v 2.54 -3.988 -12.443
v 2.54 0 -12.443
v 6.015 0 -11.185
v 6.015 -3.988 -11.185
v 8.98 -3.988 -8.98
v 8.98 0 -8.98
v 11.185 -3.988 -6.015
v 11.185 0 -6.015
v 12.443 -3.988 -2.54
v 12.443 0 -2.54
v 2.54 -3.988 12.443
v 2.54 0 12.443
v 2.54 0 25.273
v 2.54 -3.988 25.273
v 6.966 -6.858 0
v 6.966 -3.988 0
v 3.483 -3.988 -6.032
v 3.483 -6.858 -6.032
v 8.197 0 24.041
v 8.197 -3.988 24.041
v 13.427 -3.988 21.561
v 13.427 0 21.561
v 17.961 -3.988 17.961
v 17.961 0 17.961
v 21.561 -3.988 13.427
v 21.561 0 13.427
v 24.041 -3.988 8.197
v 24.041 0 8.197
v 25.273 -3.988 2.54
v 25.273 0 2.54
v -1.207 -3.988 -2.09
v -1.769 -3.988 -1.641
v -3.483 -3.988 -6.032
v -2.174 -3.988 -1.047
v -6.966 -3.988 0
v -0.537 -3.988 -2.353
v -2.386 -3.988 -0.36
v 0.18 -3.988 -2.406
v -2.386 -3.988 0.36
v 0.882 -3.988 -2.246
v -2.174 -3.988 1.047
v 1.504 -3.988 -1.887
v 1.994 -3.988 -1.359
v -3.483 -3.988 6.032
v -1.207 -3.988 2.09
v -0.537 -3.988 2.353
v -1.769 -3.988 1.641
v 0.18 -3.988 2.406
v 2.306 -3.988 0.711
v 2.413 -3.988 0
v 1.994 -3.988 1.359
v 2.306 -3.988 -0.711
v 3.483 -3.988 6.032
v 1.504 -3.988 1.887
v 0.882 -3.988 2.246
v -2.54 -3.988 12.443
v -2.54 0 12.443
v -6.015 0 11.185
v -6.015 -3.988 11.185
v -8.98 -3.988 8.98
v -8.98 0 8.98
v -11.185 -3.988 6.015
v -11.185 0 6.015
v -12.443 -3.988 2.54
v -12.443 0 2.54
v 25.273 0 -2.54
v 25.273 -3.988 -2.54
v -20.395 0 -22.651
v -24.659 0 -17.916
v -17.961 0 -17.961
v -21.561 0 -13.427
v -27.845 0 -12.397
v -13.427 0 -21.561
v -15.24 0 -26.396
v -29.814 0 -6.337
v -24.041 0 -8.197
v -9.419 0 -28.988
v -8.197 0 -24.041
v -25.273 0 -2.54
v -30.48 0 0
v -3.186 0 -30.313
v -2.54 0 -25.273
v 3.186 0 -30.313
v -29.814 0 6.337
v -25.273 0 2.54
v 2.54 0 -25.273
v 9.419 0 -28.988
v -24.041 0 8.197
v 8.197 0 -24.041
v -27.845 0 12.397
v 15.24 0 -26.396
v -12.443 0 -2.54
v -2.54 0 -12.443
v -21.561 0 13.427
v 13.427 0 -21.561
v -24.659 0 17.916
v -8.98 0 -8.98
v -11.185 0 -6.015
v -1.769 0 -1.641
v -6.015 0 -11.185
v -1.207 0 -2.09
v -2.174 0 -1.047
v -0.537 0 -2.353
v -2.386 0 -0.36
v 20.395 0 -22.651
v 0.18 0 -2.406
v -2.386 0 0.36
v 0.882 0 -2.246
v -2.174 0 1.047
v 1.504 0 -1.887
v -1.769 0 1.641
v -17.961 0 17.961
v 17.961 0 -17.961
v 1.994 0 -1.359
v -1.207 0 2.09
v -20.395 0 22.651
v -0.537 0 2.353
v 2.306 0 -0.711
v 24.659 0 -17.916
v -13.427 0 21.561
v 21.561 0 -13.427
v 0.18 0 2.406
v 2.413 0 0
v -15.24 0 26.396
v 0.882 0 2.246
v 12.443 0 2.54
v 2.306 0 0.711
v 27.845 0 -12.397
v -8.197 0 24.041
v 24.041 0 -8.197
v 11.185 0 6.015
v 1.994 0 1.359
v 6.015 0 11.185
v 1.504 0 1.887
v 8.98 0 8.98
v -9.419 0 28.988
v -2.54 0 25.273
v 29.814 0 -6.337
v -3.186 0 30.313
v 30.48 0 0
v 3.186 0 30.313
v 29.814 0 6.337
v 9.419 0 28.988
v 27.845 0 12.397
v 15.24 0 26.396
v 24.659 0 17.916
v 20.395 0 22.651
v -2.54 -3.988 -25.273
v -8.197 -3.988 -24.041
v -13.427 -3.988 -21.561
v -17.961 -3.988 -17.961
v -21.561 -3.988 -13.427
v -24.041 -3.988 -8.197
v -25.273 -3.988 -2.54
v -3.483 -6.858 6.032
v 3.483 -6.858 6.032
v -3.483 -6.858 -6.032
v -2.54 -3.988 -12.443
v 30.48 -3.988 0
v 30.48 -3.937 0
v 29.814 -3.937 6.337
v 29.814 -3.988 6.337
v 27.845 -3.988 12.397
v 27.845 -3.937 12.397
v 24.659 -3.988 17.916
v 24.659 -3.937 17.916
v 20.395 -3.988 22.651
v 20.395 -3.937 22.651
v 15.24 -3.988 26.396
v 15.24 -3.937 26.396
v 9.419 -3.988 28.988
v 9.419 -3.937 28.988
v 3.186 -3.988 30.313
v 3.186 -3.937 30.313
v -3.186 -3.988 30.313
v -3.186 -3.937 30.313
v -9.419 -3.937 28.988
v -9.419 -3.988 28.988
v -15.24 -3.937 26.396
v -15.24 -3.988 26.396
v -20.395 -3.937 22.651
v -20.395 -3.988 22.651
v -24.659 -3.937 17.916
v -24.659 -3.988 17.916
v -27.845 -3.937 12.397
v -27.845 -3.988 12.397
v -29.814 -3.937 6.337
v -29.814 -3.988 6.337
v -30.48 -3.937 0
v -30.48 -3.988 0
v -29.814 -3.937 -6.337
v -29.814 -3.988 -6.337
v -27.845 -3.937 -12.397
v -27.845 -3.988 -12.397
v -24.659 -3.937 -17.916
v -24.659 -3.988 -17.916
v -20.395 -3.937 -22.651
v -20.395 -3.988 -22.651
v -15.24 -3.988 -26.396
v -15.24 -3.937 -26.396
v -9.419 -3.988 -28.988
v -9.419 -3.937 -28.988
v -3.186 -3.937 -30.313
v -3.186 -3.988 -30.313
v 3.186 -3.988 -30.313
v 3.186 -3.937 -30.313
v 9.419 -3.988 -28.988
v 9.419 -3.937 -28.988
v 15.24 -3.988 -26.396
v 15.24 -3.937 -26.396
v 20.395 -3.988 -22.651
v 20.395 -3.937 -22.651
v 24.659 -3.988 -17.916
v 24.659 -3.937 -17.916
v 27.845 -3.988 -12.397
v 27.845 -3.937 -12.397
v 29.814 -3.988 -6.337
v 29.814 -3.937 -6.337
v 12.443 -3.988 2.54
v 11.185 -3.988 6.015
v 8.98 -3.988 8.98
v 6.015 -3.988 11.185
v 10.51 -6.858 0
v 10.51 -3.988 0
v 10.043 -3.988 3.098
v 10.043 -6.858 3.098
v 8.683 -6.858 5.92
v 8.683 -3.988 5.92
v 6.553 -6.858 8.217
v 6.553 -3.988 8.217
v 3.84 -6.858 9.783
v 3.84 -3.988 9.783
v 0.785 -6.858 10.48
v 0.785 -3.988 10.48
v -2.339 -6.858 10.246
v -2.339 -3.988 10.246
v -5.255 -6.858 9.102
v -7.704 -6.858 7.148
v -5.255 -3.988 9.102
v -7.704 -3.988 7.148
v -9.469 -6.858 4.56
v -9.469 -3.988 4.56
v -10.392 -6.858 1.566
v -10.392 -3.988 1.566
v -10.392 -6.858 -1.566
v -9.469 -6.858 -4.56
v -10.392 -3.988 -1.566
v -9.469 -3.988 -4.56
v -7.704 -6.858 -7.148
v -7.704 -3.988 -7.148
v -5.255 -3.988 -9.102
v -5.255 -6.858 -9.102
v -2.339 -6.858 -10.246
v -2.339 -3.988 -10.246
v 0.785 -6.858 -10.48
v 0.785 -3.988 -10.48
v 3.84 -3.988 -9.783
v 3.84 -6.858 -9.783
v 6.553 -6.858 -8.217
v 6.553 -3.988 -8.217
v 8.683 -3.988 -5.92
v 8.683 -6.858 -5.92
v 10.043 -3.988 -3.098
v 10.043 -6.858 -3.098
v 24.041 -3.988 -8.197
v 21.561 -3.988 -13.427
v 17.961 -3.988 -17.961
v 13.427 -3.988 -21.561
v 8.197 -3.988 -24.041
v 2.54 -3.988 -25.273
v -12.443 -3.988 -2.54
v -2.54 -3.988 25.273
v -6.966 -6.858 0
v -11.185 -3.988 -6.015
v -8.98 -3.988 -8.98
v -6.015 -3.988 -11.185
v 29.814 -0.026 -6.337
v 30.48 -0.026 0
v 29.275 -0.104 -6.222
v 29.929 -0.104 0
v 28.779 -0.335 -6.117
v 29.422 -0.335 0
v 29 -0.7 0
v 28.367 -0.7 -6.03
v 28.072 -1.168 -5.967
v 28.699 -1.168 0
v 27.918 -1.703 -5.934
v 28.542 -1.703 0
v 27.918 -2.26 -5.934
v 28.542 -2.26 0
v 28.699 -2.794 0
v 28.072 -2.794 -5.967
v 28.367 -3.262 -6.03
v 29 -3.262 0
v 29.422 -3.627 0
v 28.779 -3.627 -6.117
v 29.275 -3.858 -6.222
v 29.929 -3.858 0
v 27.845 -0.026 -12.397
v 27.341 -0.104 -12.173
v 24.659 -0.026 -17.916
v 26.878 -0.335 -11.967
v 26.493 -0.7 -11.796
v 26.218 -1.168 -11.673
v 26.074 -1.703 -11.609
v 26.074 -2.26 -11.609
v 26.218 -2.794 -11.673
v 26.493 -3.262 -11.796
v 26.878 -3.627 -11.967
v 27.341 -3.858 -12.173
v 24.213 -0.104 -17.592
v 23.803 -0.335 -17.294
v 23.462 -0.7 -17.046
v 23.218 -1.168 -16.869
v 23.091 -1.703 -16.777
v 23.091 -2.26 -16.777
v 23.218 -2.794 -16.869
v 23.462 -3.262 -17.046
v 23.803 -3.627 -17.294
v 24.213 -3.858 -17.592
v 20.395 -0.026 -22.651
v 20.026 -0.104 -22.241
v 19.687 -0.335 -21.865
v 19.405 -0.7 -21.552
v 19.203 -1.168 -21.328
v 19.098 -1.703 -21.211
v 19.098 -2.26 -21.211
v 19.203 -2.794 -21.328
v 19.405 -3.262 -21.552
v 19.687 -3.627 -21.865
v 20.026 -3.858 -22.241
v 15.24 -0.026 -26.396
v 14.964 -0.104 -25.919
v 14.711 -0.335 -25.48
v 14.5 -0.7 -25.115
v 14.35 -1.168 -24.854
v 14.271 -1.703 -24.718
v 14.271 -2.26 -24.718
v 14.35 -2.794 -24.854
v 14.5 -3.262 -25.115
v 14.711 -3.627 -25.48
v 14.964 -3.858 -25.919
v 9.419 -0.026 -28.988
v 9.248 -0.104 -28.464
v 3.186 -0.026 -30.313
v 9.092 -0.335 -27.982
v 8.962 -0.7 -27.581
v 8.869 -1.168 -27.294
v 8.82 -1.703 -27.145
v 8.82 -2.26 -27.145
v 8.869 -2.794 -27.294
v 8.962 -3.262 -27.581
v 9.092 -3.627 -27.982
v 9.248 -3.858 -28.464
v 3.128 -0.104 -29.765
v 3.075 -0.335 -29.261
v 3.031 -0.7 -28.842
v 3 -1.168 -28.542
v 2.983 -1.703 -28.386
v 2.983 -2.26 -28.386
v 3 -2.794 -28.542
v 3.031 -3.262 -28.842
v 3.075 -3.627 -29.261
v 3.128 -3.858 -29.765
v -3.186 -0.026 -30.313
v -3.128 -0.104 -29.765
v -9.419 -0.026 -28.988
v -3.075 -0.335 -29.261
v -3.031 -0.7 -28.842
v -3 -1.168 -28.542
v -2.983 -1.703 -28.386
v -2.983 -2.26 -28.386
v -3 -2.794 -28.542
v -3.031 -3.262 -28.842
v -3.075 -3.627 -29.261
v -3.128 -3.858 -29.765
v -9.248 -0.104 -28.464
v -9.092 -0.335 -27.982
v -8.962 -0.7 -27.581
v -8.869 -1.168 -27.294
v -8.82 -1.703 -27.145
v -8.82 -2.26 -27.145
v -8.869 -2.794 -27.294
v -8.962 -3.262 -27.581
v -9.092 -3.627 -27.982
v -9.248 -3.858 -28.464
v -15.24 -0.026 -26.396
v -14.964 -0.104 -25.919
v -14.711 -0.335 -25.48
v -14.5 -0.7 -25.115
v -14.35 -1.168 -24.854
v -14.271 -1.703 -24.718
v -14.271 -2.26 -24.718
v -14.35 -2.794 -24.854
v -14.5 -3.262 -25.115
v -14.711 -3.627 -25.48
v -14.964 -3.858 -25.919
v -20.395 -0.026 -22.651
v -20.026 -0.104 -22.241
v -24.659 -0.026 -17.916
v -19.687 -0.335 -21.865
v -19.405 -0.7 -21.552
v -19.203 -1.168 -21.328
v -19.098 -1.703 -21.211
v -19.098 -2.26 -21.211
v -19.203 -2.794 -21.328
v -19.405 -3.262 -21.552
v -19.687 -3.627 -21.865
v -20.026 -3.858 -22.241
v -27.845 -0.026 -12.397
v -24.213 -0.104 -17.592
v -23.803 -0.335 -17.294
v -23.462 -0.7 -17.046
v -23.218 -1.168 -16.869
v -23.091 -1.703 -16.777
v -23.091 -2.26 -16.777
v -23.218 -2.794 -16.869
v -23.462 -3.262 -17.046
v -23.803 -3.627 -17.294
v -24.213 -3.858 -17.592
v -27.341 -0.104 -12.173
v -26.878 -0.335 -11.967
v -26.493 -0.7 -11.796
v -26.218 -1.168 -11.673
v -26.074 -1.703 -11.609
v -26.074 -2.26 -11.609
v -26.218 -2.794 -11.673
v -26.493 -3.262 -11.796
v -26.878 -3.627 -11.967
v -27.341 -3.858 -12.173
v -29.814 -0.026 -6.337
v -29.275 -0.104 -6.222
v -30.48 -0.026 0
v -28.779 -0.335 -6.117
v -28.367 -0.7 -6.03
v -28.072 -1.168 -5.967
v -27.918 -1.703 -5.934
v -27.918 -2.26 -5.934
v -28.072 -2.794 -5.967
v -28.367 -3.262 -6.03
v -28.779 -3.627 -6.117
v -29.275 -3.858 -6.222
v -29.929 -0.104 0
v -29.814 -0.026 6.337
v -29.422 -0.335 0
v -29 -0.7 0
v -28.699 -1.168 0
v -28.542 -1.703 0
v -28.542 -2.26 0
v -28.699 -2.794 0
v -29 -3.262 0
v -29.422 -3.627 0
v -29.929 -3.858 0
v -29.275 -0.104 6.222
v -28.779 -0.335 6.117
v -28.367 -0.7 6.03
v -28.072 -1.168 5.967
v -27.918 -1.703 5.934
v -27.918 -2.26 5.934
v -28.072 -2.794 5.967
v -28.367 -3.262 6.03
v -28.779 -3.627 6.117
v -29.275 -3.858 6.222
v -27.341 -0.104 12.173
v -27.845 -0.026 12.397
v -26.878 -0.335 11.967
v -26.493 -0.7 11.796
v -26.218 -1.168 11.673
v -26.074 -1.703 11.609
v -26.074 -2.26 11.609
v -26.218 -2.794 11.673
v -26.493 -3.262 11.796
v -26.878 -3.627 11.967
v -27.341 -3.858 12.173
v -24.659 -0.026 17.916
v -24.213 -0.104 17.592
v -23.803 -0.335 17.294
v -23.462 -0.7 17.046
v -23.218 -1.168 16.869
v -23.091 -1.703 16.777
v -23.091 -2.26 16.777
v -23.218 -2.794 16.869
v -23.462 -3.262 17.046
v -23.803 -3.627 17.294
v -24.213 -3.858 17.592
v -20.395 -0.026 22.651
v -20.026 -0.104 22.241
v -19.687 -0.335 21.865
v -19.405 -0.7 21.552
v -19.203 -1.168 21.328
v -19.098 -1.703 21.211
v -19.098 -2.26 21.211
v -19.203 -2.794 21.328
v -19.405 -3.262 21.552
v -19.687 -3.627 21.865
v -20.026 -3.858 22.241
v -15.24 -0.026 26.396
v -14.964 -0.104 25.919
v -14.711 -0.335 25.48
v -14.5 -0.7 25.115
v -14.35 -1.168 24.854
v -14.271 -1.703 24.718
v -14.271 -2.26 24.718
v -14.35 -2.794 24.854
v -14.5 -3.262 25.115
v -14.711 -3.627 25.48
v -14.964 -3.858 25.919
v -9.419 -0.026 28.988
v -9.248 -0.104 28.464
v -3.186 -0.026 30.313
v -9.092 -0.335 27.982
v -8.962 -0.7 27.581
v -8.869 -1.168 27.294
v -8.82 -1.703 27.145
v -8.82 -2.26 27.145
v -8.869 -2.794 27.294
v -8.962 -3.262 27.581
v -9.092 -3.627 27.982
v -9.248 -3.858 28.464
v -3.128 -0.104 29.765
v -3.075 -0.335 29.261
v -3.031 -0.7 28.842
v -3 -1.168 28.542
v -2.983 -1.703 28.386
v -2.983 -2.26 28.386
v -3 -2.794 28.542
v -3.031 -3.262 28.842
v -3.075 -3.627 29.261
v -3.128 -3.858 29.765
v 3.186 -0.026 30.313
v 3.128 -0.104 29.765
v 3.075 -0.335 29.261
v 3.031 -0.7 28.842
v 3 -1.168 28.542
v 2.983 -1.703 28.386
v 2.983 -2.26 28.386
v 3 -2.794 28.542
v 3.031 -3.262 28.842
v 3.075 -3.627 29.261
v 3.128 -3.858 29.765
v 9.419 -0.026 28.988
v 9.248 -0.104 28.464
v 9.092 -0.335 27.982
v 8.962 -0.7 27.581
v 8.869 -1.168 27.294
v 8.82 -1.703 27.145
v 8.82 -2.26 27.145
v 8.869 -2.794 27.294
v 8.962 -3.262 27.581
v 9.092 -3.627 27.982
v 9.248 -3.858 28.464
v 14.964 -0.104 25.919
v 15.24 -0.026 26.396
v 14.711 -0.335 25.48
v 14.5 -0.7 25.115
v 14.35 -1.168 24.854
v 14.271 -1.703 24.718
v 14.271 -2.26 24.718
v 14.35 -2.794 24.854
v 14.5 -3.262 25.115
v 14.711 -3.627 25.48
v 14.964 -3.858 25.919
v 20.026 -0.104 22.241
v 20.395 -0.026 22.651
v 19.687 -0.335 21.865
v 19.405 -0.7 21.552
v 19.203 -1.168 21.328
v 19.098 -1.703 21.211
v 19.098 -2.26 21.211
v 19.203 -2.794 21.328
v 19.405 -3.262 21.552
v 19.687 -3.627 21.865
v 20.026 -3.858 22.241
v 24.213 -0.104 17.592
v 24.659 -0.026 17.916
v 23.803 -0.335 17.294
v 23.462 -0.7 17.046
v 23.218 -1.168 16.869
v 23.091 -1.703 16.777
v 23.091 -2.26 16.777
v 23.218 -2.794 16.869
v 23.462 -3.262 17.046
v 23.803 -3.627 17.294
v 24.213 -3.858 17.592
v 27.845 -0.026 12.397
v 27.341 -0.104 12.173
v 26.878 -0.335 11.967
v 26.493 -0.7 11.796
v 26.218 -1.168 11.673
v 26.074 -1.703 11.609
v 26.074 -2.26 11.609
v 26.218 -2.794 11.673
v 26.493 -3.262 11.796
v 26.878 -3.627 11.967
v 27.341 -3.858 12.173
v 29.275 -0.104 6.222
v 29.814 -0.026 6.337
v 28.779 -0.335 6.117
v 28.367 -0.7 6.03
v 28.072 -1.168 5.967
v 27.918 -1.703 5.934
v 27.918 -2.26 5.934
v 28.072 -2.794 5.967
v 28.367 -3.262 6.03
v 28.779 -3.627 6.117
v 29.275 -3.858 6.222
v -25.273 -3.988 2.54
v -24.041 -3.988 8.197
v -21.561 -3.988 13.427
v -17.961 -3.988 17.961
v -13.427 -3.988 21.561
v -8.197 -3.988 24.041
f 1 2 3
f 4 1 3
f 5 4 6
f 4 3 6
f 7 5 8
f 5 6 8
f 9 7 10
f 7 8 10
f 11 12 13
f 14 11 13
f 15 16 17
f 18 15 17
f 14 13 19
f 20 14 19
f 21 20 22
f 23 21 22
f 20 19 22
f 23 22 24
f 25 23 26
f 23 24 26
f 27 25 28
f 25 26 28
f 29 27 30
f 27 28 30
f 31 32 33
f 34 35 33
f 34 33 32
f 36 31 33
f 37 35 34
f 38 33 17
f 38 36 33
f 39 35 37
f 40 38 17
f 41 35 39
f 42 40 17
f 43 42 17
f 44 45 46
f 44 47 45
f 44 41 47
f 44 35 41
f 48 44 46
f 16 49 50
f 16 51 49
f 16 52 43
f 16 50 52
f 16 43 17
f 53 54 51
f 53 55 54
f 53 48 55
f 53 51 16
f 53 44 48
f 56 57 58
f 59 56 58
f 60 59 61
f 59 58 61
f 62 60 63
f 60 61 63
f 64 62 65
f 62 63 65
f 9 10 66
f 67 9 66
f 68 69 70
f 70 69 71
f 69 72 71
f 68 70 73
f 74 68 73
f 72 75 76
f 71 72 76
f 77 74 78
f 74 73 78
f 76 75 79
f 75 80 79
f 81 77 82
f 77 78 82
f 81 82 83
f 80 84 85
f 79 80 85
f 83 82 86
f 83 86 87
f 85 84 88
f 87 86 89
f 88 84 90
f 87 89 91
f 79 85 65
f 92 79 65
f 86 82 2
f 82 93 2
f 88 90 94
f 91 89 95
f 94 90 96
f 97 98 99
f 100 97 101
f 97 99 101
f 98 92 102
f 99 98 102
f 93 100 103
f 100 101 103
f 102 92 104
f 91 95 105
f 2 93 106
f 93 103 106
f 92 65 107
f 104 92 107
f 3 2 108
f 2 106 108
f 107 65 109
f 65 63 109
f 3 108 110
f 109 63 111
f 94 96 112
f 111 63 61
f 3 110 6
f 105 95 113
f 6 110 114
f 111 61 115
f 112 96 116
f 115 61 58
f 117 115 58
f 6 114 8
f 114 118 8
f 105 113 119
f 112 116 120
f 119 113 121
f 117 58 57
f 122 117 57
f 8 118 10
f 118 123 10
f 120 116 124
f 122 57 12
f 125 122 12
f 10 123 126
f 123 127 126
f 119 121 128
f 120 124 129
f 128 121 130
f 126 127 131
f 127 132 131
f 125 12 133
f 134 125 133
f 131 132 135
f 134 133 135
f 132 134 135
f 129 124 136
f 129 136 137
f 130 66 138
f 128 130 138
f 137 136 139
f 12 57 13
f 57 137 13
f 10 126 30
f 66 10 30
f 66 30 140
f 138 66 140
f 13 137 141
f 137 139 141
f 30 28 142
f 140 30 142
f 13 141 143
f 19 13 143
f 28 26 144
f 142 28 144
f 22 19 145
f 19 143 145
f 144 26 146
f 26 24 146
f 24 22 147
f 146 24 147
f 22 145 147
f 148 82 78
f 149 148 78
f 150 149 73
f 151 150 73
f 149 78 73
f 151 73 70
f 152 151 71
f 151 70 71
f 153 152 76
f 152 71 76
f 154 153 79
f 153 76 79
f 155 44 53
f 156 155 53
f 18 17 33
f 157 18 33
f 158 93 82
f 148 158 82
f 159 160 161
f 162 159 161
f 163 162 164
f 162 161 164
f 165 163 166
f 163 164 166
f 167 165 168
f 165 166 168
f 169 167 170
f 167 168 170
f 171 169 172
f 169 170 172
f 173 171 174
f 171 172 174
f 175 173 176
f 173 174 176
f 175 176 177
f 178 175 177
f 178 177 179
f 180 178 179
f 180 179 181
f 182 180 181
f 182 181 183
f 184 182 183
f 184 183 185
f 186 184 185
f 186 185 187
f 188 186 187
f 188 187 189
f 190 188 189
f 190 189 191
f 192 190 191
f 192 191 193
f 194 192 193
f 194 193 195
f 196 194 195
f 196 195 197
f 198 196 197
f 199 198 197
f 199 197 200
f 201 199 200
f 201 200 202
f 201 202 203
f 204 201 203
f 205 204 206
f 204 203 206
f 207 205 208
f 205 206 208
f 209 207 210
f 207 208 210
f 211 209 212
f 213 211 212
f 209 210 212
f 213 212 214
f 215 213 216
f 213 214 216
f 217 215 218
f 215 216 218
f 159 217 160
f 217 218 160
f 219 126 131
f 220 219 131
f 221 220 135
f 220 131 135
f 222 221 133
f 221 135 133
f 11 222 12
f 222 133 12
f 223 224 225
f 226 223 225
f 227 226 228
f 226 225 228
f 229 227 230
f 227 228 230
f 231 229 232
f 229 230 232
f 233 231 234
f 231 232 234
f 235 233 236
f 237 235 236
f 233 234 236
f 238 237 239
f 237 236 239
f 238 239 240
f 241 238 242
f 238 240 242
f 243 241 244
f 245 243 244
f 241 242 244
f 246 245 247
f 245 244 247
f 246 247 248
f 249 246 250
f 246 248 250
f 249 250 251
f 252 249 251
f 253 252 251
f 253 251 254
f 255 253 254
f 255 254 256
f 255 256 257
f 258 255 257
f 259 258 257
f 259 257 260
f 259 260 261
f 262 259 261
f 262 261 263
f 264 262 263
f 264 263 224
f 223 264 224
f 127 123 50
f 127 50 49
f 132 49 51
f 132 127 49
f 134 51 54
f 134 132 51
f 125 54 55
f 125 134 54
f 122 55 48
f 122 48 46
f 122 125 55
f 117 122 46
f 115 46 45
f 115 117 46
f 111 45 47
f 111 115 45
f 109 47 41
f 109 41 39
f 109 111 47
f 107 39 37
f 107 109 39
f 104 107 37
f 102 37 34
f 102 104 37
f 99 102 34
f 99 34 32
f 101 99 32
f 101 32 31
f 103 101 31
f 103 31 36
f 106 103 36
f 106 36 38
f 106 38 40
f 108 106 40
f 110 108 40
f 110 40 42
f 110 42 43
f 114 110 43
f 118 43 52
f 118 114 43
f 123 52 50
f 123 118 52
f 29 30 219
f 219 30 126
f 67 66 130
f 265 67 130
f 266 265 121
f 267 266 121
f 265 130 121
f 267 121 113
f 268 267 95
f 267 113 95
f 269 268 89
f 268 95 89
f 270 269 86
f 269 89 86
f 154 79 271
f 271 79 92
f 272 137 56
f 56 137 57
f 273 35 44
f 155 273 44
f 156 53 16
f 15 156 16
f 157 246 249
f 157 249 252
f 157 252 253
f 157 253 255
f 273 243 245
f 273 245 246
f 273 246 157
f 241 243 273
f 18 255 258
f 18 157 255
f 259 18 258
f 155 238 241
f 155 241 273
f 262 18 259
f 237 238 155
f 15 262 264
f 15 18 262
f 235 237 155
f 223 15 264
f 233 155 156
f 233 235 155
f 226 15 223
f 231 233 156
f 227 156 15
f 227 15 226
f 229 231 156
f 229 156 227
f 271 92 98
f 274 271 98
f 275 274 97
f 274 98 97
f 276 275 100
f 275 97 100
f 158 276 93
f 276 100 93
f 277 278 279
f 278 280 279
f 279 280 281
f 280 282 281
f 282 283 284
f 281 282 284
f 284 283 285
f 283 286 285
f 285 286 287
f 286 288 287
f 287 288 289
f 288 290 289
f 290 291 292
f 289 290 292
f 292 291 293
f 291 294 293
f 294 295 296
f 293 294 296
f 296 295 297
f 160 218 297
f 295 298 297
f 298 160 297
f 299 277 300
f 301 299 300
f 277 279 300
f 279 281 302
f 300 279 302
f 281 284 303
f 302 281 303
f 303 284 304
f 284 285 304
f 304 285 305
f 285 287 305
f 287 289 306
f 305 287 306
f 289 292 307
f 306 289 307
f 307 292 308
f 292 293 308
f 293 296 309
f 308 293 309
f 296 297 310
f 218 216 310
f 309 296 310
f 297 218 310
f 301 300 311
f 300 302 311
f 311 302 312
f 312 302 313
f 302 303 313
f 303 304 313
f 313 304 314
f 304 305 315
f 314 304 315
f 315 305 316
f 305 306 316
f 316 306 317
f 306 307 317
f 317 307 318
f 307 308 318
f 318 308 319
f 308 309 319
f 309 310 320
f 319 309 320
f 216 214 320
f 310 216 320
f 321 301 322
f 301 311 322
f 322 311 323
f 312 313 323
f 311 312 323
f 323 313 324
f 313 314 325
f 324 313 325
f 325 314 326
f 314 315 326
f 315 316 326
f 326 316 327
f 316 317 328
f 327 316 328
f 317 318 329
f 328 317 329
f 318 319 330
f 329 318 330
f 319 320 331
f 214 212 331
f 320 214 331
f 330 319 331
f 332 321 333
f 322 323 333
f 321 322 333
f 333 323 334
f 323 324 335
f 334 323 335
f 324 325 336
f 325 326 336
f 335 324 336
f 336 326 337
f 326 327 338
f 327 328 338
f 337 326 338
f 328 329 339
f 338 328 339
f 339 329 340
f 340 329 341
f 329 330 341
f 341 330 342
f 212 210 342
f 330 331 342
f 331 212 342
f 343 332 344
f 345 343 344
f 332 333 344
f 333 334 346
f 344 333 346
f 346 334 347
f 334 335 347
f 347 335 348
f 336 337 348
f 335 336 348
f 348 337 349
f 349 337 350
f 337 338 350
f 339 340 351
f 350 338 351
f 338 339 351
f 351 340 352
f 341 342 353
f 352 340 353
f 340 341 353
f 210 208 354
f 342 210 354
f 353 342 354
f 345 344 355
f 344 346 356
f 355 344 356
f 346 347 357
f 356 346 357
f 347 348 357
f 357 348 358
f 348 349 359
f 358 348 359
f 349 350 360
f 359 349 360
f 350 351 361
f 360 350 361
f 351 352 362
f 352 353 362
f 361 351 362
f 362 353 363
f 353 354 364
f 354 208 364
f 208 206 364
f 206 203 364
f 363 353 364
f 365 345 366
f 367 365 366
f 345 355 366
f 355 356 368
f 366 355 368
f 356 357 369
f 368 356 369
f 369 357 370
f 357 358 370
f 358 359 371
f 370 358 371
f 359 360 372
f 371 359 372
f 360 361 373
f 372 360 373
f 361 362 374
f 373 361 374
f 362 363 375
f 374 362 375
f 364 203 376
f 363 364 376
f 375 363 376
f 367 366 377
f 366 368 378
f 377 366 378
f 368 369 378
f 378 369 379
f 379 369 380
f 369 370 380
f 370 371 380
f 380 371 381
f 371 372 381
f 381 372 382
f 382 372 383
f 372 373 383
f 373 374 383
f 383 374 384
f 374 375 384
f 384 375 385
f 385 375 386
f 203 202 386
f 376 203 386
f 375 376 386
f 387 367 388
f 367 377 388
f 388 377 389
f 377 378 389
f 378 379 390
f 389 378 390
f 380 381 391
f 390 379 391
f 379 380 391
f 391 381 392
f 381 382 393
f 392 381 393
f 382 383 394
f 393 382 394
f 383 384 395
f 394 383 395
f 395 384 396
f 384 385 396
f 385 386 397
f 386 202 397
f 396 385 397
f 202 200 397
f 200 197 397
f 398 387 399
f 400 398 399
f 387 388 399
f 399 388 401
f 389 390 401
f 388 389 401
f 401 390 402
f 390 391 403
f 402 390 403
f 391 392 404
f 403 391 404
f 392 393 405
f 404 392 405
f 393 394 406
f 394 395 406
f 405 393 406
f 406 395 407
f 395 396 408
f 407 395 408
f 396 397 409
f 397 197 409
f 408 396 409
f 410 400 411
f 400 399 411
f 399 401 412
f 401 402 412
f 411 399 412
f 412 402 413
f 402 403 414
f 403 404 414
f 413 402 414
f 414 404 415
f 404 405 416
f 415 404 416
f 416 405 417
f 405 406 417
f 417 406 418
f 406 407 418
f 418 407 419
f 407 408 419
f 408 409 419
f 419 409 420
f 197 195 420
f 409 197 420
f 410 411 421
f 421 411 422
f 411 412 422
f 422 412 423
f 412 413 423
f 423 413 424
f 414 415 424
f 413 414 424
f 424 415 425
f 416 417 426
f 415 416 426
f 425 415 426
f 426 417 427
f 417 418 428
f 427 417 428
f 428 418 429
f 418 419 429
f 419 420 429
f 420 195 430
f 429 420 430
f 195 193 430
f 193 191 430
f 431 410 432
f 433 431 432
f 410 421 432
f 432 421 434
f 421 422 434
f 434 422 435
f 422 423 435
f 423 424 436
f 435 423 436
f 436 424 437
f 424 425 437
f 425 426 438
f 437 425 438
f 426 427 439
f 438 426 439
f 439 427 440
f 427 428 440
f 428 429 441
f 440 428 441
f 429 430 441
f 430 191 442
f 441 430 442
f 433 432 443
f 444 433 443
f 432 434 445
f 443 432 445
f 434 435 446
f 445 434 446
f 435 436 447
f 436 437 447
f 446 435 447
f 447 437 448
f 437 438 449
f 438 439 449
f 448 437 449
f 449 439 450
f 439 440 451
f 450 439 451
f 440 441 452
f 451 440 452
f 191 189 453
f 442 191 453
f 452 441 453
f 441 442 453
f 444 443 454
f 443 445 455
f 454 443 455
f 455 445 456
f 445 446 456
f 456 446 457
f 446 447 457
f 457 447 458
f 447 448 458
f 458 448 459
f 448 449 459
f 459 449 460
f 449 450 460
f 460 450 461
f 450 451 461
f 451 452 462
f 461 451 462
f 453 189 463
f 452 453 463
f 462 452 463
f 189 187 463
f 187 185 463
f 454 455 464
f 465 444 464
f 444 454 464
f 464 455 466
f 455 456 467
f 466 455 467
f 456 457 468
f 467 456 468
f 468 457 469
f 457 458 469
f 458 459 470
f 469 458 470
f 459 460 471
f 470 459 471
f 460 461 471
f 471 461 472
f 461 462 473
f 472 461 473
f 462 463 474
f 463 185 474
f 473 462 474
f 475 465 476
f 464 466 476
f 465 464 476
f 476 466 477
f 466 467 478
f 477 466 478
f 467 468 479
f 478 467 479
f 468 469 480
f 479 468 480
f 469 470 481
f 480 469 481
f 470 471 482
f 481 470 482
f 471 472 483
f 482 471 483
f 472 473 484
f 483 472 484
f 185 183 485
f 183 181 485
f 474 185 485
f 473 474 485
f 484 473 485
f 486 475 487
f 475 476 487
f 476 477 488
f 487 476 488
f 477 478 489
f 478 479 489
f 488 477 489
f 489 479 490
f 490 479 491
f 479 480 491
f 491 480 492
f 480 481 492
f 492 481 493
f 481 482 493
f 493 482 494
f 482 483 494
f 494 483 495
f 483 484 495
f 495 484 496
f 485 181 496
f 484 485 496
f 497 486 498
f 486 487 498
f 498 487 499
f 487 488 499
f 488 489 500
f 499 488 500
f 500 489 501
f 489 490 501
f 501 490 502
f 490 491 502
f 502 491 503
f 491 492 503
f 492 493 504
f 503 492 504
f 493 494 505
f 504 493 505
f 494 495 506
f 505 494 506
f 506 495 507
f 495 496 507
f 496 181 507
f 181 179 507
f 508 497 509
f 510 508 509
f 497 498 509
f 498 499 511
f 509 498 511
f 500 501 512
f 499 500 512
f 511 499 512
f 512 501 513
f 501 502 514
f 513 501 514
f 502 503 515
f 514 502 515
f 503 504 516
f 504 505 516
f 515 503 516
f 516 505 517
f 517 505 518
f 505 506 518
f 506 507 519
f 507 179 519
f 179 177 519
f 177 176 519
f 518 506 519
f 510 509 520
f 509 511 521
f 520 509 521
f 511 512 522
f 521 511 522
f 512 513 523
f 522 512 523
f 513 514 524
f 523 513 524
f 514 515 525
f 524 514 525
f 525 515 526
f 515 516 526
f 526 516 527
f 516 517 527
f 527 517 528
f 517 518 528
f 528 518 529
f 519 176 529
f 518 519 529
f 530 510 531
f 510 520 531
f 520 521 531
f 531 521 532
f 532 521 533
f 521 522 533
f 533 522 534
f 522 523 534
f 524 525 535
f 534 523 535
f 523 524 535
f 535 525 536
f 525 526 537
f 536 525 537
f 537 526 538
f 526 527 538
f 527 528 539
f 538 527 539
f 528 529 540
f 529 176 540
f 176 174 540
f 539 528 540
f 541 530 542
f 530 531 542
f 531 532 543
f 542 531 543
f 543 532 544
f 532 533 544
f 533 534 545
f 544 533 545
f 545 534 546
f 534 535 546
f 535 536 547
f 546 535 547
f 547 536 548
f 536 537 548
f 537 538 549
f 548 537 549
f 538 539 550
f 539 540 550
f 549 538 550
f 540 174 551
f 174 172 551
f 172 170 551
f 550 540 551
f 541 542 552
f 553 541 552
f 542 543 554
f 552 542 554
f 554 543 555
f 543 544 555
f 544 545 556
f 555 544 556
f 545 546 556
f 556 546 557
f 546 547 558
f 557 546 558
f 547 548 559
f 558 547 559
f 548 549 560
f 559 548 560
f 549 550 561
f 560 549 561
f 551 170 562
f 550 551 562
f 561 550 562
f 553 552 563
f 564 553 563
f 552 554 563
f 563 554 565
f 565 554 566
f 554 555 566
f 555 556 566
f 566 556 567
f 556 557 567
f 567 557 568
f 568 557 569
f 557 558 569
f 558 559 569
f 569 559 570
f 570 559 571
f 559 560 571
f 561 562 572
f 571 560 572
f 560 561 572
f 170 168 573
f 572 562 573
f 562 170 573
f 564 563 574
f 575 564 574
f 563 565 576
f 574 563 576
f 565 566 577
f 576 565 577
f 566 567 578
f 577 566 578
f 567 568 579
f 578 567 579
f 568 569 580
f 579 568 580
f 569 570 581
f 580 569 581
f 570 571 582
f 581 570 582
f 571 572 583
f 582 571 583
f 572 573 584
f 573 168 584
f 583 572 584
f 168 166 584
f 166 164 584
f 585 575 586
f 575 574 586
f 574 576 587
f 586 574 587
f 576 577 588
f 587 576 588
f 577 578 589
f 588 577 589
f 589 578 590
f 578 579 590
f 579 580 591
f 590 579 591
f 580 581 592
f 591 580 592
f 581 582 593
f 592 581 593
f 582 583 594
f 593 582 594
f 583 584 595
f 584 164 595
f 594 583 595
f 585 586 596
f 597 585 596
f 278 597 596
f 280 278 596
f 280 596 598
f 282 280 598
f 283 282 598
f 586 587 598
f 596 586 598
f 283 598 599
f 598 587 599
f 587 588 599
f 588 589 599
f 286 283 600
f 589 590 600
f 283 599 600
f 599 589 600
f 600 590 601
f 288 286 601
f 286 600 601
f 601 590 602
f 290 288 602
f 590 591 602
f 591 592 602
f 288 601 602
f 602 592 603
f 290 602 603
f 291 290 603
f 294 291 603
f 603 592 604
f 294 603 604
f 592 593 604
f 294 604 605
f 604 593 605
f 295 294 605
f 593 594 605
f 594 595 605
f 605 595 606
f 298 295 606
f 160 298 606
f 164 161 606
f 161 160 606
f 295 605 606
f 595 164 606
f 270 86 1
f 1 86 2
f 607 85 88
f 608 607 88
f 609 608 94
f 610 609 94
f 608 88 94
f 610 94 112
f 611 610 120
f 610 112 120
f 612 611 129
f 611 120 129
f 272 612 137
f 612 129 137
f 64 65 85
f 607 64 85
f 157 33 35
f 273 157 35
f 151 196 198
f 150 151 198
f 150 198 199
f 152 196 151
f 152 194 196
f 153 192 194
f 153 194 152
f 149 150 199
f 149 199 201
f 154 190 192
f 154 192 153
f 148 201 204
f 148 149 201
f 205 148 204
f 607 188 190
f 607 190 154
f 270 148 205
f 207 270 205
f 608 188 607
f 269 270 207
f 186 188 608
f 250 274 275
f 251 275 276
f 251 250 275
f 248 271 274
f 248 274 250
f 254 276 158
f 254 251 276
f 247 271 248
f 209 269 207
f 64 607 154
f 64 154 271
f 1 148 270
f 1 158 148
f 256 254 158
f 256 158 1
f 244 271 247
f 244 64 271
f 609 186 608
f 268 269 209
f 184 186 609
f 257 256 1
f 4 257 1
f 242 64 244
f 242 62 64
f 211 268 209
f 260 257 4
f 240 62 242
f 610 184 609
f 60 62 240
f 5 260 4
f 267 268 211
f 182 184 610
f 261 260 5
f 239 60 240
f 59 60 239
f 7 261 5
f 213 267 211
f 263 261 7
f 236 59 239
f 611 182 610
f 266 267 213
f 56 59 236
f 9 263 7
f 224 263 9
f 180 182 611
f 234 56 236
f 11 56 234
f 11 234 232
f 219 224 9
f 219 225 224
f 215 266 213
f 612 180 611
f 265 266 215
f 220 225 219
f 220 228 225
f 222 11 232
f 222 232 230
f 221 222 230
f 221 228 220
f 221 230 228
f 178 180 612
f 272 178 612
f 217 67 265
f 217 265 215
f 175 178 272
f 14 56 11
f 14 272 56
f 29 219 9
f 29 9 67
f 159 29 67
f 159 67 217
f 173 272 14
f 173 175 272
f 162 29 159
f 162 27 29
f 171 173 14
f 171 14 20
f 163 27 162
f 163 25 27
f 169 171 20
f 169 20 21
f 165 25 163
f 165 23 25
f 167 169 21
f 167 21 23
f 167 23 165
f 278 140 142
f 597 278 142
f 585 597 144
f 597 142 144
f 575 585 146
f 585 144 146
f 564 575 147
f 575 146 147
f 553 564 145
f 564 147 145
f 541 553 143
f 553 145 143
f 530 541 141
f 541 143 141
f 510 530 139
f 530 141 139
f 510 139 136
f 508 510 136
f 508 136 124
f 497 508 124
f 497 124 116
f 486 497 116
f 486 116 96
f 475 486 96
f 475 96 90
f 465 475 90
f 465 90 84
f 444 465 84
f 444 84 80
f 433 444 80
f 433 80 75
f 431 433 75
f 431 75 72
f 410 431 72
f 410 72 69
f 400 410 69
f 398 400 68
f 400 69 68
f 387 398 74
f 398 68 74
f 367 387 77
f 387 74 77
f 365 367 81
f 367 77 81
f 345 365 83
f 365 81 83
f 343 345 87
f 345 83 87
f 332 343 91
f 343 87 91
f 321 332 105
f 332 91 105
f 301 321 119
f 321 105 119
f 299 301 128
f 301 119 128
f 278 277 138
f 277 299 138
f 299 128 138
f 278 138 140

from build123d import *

# Parameters (mm, degrees)
F0_R     = 30.48
F0_R_2   = 10.509652
F1_DEPTH = 3.9878
F2_R     = 1.955439
F0_R_3   = 2.413
F4_DEPTH = 3.9878
F5_DEPTH = 6.858


with BuildPart() as f1:
    # F0 (on Front) → F1 (new body)
    with BuildSketch(Plane.XZ):
        Circle(F0_R)
        with BuildLine():
            Line((-25.272681, -2.54), (-12.443408, -2.54))
            ThreePointArc((-12.443408, -2.54), (-8.980256, -8.980256), (-2.54, -12.443408))
            Line((-2.54, -12.443408), (-2.54, -25.272681))
            ThreePointArc((-2.54, -25.272681), (-17.960512, -17.960512), (-25.272681, -2.54))
        make_face(mode=Mode.SUBTRACT)
        with BuildLine():
            Line((2.54, -25.272681), (2.54, -12.443408))
            ThreePointArc((2.54, -12.443408), (8.980256, -8.980256), (12.443408, -2.54))
            Line((12.443408, -2.54), (25.272681, -2.54))
            ThreePointArc((25.272681, -2.54), (17.960512, -17.960512), (2.54, -25.272681))
        make_face(mode=Mode.SUBTRACT)
        with BuildLine():
            Line((-2.54, 25.272681), (-2.54, 12.443408))
            ThreePointArc((-2.54, 12.443408), (-8.980256, 8.980256), (-12.443408, 2.54))
            Line((-12.443408, 2.54), (-25.272681, 2.54))
            ThreePointArc((-25.272681, 2.54), (-17.960512, 17.960512), (-2.54, 25.272681))
        make_face(mode=Mode.SUBTRACT)
        Circle(F0_R_2, mode=Mode.SUBTRACT)
        with BuildLine():
            Line((25.272681, 2.54), (12.443408, 2.54))
            ThreePointArc((12.443408, 2.54), (8.980256, 8.980256), (2.54, 12.443408))
            Line((2.54, 12.443408), (2.54, 25.272681))
            ThreePointArc((2.54, 25.272681), (17.960512, 17.960512), (25.272681, 2.54))
        make_face(mode=Mode.SUBTRACT)
    extrude(amount=F1_DEPTH)

    # F2 (on Top) → F3 (revolve, cut)
    with BuildSketch(Plane.XY):
        with Locations((30.477559, -1.981105)):
            Circle(F2_R)
    revolve(axis=Axis((0, 8.885407, 0), (0, 1, 0)), mode=Mode.SUBTRACT)

    # F0 (on Front) → F4 (join)
    with BuildSketch(Plane.XZ):
        Circle(F0_R_2)
        Polygon((-3.482865, 6.0325), (3.482865, 6.0325), (6.965731, 0), (3.482865, -6.0325), (-3.482865, -6.0325), (-6.965731, 0), align=None, mode=Mode.SUBTRACT)
        Polygon((6.965731, 0), (3.482865, 6.0325), (-3.482865, 6.0325), (-6.965731, 0), (-3.482865, -6.0325), (3.482865, -6.0325), align=None)
        Circle(F0_R_3, mode=Mode.SUBTRACT)
    extrude(amount=F4_DEPTH)

    # F0 (on Front) → F5 (join)
    with BuildSketch(Plane.XZ):
        Circle(F0_R_2)
        Polygon((-3.482865, 6.0325), (3.482865, 6.0325), (6.965731, 0), (3.482865, -6.0325), (-3.482865, -6.0325), (-6.965731, 0), align=None, mode=Mode.SUBTRACT)
    extrude(amount=F5_DEPTH)


solid = f1.part
